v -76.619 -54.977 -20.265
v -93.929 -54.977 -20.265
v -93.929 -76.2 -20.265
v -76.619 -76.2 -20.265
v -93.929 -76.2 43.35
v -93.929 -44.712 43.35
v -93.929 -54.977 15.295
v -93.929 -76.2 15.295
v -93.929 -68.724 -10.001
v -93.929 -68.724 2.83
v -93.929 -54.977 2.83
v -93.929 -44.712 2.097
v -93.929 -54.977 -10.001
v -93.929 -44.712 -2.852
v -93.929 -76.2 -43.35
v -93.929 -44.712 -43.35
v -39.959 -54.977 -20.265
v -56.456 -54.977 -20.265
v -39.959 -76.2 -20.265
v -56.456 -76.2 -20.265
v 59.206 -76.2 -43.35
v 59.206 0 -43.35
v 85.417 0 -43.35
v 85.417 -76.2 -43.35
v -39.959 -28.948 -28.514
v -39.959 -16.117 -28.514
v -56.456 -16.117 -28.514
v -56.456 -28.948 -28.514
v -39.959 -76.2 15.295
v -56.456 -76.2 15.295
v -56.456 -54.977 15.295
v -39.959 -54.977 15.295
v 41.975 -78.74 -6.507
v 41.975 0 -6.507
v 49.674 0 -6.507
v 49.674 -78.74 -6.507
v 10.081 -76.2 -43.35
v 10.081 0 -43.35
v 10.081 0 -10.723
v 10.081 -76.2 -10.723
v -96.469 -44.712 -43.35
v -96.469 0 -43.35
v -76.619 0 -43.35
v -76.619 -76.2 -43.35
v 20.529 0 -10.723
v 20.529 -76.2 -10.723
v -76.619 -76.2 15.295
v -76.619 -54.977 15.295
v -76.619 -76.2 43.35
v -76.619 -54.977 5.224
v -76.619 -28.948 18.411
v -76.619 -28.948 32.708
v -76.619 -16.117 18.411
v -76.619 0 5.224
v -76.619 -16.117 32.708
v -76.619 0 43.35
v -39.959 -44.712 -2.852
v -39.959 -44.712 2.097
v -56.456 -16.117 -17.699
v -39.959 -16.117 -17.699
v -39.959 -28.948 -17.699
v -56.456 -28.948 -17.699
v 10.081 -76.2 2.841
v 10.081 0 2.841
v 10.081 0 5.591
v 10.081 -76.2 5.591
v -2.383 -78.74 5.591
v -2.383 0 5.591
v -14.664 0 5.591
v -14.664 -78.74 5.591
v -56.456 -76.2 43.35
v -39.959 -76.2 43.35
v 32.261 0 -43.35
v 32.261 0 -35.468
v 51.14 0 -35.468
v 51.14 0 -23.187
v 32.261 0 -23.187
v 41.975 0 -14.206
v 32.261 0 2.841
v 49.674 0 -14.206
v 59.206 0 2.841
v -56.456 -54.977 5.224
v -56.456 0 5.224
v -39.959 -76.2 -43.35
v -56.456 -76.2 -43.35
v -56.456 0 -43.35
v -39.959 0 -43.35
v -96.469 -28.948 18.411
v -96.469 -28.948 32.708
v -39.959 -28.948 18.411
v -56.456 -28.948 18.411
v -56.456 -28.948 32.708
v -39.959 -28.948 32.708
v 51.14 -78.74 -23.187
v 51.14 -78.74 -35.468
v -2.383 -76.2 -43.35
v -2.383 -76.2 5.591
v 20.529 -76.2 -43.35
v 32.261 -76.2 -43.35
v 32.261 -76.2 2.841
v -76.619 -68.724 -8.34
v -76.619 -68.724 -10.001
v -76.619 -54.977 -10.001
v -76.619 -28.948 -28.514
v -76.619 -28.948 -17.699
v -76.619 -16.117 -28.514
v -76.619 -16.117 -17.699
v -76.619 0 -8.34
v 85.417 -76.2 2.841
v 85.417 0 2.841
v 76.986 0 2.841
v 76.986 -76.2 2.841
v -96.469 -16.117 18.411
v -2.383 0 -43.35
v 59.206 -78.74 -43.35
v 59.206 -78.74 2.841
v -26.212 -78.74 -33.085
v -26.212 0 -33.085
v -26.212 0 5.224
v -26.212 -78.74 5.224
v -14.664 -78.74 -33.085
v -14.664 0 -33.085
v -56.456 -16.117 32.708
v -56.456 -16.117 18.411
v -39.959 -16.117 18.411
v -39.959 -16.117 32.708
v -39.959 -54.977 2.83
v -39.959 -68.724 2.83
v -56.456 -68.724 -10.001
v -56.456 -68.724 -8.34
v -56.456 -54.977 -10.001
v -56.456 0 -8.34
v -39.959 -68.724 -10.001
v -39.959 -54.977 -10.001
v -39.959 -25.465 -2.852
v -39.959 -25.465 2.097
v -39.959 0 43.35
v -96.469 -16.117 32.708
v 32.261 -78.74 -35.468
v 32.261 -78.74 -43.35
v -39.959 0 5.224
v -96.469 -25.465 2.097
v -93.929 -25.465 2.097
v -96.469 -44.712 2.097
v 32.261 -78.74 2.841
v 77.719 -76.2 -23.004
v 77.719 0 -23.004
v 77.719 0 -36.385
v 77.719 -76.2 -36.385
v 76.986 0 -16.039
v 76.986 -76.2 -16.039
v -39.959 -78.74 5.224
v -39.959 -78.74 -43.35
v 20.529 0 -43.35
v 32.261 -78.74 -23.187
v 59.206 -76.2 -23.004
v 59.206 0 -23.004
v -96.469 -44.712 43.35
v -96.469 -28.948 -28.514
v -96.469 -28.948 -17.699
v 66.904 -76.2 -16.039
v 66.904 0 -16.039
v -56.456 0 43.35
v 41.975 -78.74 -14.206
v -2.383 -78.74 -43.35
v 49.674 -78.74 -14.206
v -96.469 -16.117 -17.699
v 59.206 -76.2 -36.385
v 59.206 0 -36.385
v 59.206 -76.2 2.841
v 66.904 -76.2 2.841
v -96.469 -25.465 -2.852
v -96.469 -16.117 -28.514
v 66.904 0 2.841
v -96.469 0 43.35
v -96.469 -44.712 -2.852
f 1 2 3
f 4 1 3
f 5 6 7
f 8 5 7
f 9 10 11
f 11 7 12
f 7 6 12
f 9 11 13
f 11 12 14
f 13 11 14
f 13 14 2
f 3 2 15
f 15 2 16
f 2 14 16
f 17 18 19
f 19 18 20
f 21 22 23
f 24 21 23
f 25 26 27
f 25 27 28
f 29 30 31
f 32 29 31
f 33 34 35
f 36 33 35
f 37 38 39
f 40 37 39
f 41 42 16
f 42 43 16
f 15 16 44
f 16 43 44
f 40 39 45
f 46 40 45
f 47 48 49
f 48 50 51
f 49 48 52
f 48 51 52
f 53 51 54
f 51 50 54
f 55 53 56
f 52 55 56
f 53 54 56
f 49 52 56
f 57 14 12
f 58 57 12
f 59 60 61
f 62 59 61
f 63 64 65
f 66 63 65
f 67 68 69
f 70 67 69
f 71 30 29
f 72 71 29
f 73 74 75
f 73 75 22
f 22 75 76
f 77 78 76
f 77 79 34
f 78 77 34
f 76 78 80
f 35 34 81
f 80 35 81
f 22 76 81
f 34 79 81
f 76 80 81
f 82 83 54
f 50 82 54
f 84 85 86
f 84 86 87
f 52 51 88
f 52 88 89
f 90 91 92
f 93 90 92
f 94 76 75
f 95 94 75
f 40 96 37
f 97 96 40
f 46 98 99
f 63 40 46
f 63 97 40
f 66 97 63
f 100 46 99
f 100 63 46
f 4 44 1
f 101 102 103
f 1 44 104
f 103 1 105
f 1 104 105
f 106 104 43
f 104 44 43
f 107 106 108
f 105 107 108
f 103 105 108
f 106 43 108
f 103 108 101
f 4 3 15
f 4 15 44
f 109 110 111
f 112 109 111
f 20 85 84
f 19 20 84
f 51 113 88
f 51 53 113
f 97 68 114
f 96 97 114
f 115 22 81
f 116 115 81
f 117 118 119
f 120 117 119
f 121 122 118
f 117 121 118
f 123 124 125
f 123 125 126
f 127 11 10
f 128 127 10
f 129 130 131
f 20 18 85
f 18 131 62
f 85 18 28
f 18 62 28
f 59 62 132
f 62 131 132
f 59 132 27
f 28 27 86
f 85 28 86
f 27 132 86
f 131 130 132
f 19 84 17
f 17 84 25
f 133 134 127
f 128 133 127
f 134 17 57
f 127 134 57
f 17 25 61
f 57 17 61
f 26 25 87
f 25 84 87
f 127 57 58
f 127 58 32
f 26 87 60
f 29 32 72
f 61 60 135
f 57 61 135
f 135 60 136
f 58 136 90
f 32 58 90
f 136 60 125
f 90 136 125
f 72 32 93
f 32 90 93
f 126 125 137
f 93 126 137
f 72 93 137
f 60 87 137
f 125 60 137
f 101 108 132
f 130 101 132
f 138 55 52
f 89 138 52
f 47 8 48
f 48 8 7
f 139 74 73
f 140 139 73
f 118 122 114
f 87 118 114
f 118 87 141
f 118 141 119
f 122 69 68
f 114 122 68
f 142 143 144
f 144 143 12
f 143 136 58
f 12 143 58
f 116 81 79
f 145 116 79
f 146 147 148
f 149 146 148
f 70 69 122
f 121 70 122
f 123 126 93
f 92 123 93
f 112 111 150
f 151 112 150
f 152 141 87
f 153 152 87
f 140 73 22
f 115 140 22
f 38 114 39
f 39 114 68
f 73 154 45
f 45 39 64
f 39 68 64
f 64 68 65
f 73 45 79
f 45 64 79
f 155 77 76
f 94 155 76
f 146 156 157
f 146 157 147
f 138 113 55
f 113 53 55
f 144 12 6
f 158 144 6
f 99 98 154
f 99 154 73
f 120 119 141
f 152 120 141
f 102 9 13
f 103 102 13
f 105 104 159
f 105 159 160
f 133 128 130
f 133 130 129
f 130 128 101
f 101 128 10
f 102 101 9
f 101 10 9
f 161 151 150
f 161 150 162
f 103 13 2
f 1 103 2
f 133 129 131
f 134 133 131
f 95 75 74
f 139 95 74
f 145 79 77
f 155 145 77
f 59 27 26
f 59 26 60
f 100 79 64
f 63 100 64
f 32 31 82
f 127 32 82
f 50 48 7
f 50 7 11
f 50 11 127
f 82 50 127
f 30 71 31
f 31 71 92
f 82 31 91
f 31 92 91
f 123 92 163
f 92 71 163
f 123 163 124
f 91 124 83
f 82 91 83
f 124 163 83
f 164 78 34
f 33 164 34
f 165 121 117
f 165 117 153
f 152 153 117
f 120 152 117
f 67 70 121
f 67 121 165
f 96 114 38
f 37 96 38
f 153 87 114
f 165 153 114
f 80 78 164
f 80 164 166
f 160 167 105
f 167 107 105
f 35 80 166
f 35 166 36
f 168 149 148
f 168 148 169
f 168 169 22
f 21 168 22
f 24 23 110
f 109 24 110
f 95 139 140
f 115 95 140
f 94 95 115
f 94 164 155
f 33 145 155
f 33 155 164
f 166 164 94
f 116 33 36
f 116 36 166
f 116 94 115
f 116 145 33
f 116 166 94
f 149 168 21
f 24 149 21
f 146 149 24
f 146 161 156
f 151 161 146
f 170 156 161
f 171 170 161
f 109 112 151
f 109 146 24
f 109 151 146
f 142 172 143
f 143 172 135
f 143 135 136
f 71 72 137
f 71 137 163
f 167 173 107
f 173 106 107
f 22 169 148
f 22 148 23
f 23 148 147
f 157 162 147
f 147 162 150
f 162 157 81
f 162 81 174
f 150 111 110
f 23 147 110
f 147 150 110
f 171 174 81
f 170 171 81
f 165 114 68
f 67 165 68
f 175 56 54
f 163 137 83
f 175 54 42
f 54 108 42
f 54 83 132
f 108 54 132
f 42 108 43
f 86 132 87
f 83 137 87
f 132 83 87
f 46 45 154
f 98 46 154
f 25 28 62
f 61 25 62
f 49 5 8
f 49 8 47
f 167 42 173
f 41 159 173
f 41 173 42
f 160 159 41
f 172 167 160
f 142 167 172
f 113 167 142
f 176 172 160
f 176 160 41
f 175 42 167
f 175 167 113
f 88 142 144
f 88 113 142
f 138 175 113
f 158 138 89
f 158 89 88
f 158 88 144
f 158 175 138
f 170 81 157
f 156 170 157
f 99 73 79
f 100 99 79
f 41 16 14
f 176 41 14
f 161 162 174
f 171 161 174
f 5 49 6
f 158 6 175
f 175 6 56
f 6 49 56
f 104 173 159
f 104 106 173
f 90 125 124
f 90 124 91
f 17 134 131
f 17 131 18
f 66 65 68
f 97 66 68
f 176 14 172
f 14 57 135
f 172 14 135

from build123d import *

# Parameters (mm, degrees)
F1_DEPTH = 76.2
F2_DEPTH = 78.74
F0_W     = 7.6985582709
F0_H     = 7.6985568739
F3_W     = 19.2463956773
F3_H     = 4.9490719102
F3_W_2   = 12.830927968
F3_H_2   = 14.2973195761
F3_H_3   = 10.814640671
F4_DEPTH = 179.3468610773
F5_DEPTH = 2.54


with BuildPart() as f1:
    # F0 (on Front) → F1 (new body)
    with BuildSketch(Plane.XZ):
        Polygon((-93.9285457134, 43.3502085507), (-93.9285457134, -43.3502085507), (-76.6189694405, -43.3502085507), (-76.6189694405, -8.3401026204), (-56.4560815692, -8.3401026204), (-56.4560815692, -43.3502085507), (-39.9591773748, -43.3502085507), (-39.9591773748, 5.224020686), (-39.9591773748, 43.3502085507), (-56.4560815692, 43.3502085507), (-56.4560815692, 5.224020686), (-76.6189694405, 5.224020686), (-76.6189694405, 43.3502085507), align=None)
    extrude(amount=F1_DEPTH)

    # F3 (on face) → F4 (cut, through all)
    with BuildSketch(Plane(origin=(-93.9285457134, 0, 0), x_dir=(0, -1, 0), z_dir=(-1, 0, 0))):
        with Locations((35.0886601955, -0.377497403)):
            Rectangle(F3_W, F3_H)
        Polygon((76.2, -20.2654339373), (76.2, 15.2945648879), (54.9766011536, 15.2945648879), (54.9766011536, 2.8302345891), (68.7240213156, 2.8302345891), (68.7240213156, -10.0006936118), (54.9766011536, -10.0006936118), (54.9766011536, -20.2654339373), align=None)
        with Locations((22.5326810032, 25.559307076)):
            Rectangle(F3_W_2, F3_H_2)
        with Locations((22.5326810032, -23.1065694243)):
            Rectangle(F3_W_2, F3_H_3)
    extrude(amount=-F4_DEPTH, mode=Mode.SUBTRACT)

    # F3 (on face) → F5 (join)
    with BuildSketch(Plane(origin=(-93.9285457134, 0, 0), x_dir=(0, -1, 0), z_dir=(-1, 0, 0))):
        Polygon((44.7118580341, 43.3502085507), (0, 43.3502085507), (0, -43.3502085507), (44.7118580341, -43.3502085507), (44.7118580341, -2.8520333581), (25.4654623568, -2.8520333581), (25.4654623568, 2.0970385522), (44.7118580341, 2.0970385522), align=None)
        with Locations((22.5326810032, -23.1065694243)):
            Rectangle(F3_W_2, F3_H_3, mode=Mode.SUBTRACT)
        with Locations((22.5326810032, 25.559307076)):
            Rectangle(F3_W_2, F3_H_2, mode=Mode.SUBTRACT)
    extrude(amount=F5_DEPTH)


with BuildPart() as f1b:
    # F0 (on Front) → F1, piece 2 (new body)
    with BuildSketch(Plane.XZ):
        Polygon((-2.3828870617, 5.590618588), (-2.3828870617, -43.3502085507), (10.081442073, -43.3502085507), (10.081442073, -10.7229892164), (20.529486239, -10.7229892164), (20.529486239, -43.3502085507), (32.2606191039, -43.3502085507), (32.2606191039, -35.4683510959), (32.2606191039, -23.1873188168), (32.2606191039, -10.7229892164), (32.2606191039, 2.8411338571), (10.081442073, 2.8411338571), (10.081442073, 5.590618588), align=None)
    extrude(amount=F1_DEPTH)


with BuildPart() as f1c:
    # F0 (on Front) → F1, piece 3 (new body)
    with BuildSketch(Plane.XZ):
        Polygon((66.9041201472, 2.8411338571), (59.2055656016, 2.8411338571), (59.2055656016, -23.0040214956), (77.7187645435, -23.0040214956), (77.7187645435, -36.3848470151), (59.2055656016, -36.3848470151), (59.2055656016, -43.3502085507), (77.7187645435, -43.3502085507), (85.4173153639, -43.3502085507), (85.4173153639, -23.0040214956), (85.4173153639, 2.8411338571), (76.9855678082, 2.8411338571), (76.9855678082, -16.03865996), (66.9041201472, -16.03865996), align=None)
    extrude(amount=F1_DEPTH)


with BuildPart() as f2:
    # F0 (on Front) → F2 (new body)
    with BuildSketch(Plane.XZ):
        Polygon((-39.9591773748, 5.224020686), (-39.9591773748, -43.3502085507), (-26.2117534876, -43.3502085507), (-14.6639179438, -43.3502085507), (-2.3828870617, -43.3502085507), (-2.3828870617, 5.590618588), (-14.6639179438, 5.590618588), (-14.6639179438, -33.0854654312), (-26.2117534876, -33.0854654312), (-26.2117534876, 5.224020686), align=None)
    extrude(amount=F2_DEPTH)


with BuildPart() as f2b:
    # F0 (on Front) → F2, piece 2 (new body)
    with BuildSketch(Plane.XZ):
        Polygon((59.2055656016, 2.8411338571), (32.2606191039, 2.8411338571), (32.2606191039, -10.7229892164), (32.2606191039, -23.1873188168), (51.1404126883, -23.1873188168), (51.1404126883, -35.4683510959), (32.2606191039, -35.4683510959), (32.2606191039, -43.3502085507), (51.1404126883, -43.3502085507), (59.2055656016, -43.3502085507), (59.2055656016, -36.3848470151), (59.2055656016, -23.1873188168), (59.2055656016, -23.0040214956), align=None)
        with Locations((45.8247438073, -10.3563915472)):
            Rectangle(F0_W, F0_H, mode=Mode.SUBTRACT)
    extrude(amount=F2_DEPTH)


solid = Compound([f1.part, f1b.part, f1c.part, f2.part, f2b.part])
